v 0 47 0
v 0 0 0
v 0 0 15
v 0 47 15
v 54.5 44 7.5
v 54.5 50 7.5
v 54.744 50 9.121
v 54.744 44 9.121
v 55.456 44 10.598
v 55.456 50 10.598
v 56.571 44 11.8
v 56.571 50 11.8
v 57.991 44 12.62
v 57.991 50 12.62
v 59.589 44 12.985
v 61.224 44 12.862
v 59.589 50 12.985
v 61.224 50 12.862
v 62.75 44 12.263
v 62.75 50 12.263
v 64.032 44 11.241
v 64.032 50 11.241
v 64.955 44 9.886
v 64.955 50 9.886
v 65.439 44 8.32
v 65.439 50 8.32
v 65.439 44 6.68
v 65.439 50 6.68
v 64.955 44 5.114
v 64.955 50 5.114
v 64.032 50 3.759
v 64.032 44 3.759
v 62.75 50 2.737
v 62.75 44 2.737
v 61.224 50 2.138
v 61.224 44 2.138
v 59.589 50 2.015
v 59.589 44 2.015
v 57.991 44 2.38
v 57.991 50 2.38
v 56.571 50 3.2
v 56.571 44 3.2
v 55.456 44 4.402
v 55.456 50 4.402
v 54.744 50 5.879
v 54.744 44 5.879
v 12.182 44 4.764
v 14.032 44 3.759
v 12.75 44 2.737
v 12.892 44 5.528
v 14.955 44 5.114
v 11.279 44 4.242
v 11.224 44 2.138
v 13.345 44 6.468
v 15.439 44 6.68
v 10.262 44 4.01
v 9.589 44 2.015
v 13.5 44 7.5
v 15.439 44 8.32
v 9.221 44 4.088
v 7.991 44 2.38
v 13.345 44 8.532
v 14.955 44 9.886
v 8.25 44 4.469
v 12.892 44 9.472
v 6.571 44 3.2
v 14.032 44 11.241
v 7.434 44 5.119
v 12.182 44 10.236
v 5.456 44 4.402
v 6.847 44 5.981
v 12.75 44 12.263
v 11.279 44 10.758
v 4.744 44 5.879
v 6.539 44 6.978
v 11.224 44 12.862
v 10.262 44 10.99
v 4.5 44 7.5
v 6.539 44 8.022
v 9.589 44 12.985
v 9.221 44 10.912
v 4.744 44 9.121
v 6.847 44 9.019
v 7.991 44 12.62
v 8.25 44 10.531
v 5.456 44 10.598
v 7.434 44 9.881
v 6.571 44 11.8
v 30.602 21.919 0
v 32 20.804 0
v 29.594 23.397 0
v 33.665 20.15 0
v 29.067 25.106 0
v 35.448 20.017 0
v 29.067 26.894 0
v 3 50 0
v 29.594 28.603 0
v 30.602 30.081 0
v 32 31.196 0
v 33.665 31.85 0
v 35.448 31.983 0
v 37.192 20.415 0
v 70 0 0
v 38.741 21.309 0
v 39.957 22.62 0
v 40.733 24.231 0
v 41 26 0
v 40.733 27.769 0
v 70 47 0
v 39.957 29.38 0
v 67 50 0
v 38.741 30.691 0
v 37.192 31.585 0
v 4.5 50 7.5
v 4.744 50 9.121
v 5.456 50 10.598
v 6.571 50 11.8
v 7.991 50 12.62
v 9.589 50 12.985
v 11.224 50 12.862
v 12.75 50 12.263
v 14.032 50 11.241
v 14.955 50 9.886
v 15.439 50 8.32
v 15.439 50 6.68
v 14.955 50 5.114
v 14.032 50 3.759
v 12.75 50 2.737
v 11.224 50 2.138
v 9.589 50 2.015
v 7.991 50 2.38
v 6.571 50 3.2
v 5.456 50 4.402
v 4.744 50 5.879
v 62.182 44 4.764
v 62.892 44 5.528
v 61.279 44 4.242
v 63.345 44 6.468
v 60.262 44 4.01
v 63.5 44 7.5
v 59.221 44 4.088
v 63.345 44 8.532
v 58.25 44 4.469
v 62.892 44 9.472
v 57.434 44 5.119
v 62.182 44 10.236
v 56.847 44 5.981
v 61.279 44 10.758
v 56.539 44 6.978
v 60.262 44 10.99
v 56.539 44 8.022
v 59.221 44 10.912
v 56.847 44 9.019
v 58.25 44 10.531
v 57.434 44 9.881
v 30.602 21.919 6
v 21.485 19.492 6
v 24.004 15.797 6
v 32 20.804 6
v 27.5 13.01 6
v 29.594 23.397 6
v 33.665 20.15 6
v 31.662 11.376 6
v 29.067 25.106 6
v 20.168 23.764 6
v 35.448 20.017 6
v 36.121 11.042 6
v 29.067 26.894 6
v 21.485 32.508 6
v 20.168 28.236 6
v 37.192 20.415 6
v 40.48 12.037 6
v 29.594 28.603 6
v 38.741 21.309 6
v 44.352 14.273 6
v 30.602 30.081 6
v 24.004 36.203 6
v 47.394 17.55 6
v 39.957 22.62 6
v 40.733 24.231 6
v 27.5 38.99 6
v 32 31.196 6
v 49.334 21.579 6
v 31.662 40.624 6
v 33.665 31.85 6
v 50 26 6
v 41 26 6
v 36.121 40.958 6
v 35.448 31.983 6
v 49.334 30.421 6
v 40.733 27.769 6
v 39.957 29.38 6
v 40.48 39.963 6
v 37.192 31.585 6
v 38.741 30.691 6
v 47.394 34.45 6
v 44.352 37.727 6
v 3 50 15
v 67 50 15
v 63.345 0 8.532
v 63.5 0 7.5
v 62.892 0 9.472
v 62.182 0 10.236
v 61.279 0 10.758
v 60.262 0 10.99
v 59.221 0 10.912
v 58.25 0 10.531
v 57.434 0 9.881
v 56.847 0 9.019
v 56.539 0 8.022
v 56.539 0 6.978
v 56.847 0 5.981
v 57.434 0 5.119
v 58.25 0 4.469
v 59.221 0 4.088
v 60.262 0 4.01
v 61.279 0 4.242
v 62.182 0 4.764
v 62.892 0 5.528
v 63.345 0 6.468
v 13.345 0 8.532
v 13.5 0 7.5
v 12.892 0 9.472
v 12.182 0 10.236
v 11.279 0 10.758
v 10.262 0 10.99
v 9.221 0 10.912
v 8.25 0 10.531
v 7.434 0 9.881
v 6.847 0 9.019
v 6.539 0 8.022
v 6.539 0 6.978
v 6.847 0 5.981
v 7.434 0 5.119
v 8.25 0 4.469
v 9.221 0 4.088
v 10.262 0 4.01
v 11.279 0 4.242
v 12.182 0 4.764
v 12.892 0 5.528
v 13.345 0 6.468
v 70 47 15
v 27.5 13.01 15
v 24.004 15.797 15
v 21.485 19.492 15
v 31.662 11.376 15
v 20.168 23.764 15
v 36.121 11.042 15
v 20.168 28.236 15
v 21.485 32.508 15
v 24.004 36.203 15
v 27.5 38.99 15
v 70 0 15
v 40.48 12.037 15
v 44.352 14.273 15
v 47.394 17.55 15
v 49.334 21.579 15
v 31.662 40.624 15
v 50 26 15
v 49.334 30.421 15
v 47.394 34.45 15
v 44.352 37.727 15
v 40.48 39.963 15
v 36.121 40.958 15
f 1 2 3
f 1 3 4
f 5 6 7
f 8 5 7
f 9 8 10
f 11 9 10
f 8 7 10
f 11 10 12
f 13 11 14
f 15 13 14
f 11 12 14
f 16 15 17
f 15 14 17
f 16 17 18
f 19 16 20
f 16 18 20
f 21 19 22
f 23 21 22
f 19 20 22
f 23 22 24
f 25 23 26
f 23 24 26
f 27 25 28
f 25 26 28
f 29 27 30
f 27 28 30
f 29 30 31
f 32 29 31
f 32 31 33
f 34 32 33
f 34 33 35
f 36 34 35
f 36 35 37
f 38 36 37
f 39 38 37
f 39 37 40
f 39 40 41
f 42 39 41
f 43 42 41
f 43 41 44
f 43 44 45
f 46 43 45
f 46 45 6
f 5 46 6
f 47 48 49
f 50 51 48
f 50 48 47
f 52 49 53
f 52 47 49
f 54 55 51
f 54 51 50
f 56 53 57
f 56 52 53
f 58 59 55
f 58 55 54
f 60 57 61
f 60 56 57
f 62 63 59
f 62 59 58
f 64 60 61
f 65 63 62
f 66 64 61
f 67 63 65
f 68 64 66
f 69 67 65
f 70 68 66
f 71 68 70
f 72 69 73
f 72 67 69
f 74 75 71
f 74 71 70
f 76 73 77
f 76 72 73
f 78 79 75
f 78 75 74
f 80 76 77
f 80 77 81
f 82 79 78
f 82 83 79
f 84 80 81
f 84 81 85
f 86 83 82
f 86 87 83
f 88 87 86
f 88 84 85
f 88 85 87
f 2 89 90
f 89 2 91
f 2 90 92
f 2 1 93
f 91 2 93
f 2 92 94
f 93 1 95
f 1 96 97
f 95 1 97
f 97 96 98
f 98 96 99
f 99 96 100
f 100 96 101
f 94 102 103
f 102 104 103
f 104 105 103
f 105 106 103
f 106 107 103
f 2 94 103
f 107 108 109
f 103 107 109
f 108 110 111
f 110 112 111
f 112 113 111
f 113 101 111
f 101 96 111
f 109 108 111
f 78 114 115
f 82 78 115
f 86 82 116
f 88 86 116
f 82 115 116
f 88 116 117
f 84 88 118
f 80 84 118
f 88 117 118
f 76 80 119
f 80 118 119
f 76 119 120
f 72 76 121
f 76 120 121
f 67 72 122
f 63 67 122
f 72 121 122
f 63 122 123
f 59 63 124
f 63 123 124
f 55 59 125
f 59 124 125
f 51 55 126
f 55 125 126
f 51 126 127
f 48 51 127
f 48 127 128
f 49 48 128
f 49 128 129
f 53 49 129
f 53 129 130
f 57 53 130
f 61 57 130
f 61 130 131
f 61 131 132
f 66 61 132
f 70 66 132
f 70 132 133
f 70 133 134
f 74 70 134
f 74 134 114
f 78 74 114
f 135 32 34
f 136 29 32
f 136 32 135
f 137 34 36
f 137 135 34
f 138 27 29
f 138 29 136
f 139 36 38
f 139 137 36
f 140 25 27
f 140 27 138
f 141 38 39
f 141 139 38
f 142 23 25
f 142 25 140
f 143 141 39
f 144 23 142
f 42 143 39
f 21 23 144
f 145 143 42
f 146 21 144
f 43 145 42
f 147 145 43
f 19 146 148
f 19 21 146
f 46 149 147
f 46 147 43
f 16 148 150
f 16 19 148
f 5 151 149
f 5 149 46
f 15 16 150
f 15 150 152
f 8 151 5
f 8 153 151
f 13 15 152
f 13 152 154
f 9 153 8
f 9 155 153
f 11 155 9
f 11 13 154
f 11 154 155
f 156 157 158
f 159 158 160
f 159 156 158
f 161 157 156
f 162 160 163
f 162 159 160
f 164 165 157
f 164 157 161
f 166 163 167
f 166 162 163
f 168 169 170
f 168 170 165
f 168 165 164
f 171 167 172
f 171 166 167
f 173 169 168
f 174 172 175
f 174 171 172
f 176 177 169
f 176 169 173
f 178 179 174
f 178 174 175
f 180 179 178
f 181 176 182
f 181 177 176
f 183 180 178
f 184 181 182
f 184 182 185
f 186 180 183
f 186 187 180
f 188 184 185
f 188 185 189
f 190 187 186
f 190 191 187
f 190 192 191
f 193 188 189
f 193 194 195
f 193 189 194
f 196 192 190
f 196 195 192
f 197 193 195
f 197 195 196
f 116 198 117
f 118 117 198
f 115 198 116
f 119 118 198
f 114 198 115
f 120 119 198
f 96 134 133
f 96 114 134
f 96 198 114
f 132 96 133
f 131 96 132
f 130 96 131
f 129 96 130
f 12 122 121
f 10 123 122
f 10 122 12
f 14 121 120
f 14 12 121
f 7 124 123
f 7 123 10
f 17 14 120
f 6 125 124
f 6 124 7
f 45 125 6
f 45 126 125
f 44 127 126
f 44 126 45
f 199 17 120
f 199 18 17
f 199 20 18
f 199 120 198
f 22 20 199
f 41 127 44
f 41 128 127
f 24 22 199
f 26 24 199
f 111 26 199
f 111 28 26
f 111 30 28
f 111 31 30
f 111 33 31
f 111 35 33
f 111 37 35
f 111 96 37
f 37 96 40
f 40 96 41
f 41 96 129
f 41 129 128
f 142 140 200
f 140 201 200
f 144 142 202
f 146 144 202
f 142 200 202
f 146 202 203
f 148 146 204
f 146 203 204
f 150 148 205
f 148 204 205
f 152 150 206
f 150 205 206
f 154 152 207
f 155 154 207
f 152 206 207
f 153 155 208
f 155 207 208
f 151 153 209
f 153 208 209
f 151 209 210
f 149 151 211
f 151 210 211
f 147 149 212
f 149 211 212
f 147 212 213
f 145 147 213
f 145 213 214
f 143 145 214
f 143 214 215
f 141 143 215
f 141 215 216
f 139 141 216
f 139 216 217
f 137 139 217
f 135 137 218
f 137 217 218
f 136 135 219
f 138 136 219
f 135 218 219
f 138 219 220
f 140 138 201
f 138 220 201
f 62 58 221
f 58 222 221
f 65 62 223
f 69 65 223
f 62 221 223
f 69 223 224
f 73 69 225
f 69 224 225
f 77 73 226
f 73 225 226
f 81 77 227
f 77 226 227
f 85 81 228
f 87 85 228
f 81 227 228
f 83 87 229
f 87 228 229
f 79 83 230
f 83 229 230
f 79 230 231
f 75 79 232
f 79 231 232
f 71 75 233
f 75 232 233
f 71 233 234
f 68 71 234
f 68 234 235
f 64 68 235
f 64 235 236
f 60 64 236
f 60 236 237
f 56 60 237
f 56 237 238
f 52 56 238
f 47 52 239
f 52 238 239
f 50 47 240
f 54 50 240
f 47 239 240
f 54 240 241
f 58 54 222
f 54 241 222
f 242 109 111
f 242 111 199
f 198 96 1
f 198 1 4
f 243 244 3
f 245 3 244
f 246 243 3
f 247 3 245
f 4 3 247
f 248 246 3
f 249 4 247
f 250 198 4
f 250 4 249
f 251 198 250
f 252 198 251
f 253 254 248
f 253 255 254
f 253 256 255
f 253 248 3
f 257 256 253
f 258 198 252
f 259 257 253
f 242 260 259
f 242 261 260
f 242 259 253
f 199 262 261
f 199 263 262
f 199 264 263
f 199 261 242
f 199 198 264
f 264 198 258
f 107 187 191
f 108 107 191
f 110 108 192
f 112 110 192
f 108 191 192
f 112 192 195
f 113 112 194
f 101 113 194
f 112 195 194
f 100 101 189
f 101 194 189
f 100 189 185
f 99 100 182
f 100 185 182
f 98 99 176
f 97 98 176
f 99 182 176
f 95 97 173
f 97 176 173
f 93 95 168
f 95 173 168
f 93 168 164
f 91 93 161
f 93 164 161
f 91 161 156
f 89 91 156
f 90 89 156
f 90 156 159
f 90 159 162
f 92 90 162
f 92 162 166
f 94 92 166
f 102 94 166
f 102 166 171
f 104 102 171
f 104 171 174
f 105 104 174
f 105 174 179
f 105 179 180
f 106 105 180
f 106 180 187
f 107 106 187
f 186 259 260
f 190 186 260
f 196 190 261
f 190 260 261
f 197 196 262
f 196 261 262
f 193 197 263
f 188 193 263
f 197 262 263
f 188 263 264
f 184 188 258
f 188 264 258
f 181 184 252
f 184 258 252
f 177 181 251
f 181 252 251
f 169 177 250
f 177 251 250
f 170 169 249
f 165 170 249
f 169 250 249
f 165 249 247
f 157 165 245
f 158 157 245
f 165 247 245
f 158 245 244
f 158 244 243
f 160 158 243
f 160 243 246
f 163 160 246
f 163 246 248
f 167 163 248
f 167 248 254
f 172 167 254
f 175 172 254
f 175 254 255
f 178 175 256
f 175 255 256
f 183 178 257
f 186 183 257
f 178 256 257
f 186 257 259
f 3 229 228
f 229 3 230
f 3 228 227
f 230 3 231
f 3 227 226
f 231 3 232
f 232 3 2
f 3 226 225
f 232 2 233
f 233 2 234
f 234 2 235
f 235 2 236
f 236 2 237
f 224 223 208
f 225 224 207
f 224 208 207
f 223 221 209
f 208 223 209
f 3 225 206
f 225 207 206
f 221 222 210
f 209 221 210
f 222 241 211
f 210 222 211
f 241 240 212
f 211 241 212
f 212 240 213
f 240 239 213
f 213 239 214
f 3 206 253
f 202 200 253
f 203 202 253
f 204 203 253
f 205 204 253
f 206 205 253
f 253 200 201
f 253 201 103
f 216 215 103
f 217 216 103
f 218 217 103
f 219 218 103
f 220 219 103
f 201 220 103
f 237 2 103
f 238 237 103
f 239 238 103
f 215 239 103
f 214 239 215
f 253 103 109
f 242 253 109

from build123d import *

# Parameters (mm, degrees)
SKETCH_1_W                   = 70
SKETCH_1_H                   = 50
EXTRUDE_1_DEPTH              = 15
SKETCH_2_R                   = 6
CUT_EXTRUDE_1_DEPTH          = 88.321245983
CHAMFER_1_SIZE               = 3
HOLE_WIZARD_M6_1_D           = 7
HOLE_WIZARD_M6_1_CBORE_D     = 11
HOLE_WIZARD_M6_1_CBORE_DEPTH = 6
SKETCH_5_R                   = 15
CUT_EXTRUDE_2_DEPTH          = 9


with BuildPart() as part:
    # 草图1 → 凸台-拉伸1 (new body)
    with BuildSketch(Plane.XY):
        with Locations((35, 25)):
            Rectangle(SKETCH_1_W, SKETCH_1_H)
    extrude(amount=EXTRUDE_1_DEPTH)

    # 草图2 → 切除-拉伸1 (cut, through all)
    with BuildSketch(Plane.XY.offset(15)):
        with Locations((35, 26)):
            Circle(SKETCH_2_R)
    extrude(amount=-CUT_EXTRUDE_1_DEPTH, mode=Mode.SUBTRACT)

    # 倒角1
    chamfer_1_edges = [part.edges().sort_by_distance(p)[0] for p in [
        (0, 50, 7.5),
        (70, 50, 7.5),
    ]]
    chamfer(chamfer_1_edges, length=CHAMFER_1_SIZE)

    # M6 六角凹头螺钉的柱形沉头孔1 (through all)
    with Locations(Plane(origin=(0, 50, 0), x_dir=(-1, 0, 0), z_dir=(0, 1, 0))):
        with Locations((-10, 7.5), (-60, 7.5)):
            CounterBoreHole(HOLE_WIZARD_M6_1_D / 2, HOLE_WIZARD_M6_1_CBORE_D / 2, HOLE_WIZARD_M6_1_CBORE_DEPTH)

    # 草图5 → 切除-拉伸2 (cut)
    with BuildSketch(Plane.XY.offset(15)):
        with Locations((35, 26)):
            Circle(SKETCH_5_R)
    extrude(amount=-CUT_EXTRUDE_2_DEPTH, mode=Mode.SUBTRACT)


solid = part.part
